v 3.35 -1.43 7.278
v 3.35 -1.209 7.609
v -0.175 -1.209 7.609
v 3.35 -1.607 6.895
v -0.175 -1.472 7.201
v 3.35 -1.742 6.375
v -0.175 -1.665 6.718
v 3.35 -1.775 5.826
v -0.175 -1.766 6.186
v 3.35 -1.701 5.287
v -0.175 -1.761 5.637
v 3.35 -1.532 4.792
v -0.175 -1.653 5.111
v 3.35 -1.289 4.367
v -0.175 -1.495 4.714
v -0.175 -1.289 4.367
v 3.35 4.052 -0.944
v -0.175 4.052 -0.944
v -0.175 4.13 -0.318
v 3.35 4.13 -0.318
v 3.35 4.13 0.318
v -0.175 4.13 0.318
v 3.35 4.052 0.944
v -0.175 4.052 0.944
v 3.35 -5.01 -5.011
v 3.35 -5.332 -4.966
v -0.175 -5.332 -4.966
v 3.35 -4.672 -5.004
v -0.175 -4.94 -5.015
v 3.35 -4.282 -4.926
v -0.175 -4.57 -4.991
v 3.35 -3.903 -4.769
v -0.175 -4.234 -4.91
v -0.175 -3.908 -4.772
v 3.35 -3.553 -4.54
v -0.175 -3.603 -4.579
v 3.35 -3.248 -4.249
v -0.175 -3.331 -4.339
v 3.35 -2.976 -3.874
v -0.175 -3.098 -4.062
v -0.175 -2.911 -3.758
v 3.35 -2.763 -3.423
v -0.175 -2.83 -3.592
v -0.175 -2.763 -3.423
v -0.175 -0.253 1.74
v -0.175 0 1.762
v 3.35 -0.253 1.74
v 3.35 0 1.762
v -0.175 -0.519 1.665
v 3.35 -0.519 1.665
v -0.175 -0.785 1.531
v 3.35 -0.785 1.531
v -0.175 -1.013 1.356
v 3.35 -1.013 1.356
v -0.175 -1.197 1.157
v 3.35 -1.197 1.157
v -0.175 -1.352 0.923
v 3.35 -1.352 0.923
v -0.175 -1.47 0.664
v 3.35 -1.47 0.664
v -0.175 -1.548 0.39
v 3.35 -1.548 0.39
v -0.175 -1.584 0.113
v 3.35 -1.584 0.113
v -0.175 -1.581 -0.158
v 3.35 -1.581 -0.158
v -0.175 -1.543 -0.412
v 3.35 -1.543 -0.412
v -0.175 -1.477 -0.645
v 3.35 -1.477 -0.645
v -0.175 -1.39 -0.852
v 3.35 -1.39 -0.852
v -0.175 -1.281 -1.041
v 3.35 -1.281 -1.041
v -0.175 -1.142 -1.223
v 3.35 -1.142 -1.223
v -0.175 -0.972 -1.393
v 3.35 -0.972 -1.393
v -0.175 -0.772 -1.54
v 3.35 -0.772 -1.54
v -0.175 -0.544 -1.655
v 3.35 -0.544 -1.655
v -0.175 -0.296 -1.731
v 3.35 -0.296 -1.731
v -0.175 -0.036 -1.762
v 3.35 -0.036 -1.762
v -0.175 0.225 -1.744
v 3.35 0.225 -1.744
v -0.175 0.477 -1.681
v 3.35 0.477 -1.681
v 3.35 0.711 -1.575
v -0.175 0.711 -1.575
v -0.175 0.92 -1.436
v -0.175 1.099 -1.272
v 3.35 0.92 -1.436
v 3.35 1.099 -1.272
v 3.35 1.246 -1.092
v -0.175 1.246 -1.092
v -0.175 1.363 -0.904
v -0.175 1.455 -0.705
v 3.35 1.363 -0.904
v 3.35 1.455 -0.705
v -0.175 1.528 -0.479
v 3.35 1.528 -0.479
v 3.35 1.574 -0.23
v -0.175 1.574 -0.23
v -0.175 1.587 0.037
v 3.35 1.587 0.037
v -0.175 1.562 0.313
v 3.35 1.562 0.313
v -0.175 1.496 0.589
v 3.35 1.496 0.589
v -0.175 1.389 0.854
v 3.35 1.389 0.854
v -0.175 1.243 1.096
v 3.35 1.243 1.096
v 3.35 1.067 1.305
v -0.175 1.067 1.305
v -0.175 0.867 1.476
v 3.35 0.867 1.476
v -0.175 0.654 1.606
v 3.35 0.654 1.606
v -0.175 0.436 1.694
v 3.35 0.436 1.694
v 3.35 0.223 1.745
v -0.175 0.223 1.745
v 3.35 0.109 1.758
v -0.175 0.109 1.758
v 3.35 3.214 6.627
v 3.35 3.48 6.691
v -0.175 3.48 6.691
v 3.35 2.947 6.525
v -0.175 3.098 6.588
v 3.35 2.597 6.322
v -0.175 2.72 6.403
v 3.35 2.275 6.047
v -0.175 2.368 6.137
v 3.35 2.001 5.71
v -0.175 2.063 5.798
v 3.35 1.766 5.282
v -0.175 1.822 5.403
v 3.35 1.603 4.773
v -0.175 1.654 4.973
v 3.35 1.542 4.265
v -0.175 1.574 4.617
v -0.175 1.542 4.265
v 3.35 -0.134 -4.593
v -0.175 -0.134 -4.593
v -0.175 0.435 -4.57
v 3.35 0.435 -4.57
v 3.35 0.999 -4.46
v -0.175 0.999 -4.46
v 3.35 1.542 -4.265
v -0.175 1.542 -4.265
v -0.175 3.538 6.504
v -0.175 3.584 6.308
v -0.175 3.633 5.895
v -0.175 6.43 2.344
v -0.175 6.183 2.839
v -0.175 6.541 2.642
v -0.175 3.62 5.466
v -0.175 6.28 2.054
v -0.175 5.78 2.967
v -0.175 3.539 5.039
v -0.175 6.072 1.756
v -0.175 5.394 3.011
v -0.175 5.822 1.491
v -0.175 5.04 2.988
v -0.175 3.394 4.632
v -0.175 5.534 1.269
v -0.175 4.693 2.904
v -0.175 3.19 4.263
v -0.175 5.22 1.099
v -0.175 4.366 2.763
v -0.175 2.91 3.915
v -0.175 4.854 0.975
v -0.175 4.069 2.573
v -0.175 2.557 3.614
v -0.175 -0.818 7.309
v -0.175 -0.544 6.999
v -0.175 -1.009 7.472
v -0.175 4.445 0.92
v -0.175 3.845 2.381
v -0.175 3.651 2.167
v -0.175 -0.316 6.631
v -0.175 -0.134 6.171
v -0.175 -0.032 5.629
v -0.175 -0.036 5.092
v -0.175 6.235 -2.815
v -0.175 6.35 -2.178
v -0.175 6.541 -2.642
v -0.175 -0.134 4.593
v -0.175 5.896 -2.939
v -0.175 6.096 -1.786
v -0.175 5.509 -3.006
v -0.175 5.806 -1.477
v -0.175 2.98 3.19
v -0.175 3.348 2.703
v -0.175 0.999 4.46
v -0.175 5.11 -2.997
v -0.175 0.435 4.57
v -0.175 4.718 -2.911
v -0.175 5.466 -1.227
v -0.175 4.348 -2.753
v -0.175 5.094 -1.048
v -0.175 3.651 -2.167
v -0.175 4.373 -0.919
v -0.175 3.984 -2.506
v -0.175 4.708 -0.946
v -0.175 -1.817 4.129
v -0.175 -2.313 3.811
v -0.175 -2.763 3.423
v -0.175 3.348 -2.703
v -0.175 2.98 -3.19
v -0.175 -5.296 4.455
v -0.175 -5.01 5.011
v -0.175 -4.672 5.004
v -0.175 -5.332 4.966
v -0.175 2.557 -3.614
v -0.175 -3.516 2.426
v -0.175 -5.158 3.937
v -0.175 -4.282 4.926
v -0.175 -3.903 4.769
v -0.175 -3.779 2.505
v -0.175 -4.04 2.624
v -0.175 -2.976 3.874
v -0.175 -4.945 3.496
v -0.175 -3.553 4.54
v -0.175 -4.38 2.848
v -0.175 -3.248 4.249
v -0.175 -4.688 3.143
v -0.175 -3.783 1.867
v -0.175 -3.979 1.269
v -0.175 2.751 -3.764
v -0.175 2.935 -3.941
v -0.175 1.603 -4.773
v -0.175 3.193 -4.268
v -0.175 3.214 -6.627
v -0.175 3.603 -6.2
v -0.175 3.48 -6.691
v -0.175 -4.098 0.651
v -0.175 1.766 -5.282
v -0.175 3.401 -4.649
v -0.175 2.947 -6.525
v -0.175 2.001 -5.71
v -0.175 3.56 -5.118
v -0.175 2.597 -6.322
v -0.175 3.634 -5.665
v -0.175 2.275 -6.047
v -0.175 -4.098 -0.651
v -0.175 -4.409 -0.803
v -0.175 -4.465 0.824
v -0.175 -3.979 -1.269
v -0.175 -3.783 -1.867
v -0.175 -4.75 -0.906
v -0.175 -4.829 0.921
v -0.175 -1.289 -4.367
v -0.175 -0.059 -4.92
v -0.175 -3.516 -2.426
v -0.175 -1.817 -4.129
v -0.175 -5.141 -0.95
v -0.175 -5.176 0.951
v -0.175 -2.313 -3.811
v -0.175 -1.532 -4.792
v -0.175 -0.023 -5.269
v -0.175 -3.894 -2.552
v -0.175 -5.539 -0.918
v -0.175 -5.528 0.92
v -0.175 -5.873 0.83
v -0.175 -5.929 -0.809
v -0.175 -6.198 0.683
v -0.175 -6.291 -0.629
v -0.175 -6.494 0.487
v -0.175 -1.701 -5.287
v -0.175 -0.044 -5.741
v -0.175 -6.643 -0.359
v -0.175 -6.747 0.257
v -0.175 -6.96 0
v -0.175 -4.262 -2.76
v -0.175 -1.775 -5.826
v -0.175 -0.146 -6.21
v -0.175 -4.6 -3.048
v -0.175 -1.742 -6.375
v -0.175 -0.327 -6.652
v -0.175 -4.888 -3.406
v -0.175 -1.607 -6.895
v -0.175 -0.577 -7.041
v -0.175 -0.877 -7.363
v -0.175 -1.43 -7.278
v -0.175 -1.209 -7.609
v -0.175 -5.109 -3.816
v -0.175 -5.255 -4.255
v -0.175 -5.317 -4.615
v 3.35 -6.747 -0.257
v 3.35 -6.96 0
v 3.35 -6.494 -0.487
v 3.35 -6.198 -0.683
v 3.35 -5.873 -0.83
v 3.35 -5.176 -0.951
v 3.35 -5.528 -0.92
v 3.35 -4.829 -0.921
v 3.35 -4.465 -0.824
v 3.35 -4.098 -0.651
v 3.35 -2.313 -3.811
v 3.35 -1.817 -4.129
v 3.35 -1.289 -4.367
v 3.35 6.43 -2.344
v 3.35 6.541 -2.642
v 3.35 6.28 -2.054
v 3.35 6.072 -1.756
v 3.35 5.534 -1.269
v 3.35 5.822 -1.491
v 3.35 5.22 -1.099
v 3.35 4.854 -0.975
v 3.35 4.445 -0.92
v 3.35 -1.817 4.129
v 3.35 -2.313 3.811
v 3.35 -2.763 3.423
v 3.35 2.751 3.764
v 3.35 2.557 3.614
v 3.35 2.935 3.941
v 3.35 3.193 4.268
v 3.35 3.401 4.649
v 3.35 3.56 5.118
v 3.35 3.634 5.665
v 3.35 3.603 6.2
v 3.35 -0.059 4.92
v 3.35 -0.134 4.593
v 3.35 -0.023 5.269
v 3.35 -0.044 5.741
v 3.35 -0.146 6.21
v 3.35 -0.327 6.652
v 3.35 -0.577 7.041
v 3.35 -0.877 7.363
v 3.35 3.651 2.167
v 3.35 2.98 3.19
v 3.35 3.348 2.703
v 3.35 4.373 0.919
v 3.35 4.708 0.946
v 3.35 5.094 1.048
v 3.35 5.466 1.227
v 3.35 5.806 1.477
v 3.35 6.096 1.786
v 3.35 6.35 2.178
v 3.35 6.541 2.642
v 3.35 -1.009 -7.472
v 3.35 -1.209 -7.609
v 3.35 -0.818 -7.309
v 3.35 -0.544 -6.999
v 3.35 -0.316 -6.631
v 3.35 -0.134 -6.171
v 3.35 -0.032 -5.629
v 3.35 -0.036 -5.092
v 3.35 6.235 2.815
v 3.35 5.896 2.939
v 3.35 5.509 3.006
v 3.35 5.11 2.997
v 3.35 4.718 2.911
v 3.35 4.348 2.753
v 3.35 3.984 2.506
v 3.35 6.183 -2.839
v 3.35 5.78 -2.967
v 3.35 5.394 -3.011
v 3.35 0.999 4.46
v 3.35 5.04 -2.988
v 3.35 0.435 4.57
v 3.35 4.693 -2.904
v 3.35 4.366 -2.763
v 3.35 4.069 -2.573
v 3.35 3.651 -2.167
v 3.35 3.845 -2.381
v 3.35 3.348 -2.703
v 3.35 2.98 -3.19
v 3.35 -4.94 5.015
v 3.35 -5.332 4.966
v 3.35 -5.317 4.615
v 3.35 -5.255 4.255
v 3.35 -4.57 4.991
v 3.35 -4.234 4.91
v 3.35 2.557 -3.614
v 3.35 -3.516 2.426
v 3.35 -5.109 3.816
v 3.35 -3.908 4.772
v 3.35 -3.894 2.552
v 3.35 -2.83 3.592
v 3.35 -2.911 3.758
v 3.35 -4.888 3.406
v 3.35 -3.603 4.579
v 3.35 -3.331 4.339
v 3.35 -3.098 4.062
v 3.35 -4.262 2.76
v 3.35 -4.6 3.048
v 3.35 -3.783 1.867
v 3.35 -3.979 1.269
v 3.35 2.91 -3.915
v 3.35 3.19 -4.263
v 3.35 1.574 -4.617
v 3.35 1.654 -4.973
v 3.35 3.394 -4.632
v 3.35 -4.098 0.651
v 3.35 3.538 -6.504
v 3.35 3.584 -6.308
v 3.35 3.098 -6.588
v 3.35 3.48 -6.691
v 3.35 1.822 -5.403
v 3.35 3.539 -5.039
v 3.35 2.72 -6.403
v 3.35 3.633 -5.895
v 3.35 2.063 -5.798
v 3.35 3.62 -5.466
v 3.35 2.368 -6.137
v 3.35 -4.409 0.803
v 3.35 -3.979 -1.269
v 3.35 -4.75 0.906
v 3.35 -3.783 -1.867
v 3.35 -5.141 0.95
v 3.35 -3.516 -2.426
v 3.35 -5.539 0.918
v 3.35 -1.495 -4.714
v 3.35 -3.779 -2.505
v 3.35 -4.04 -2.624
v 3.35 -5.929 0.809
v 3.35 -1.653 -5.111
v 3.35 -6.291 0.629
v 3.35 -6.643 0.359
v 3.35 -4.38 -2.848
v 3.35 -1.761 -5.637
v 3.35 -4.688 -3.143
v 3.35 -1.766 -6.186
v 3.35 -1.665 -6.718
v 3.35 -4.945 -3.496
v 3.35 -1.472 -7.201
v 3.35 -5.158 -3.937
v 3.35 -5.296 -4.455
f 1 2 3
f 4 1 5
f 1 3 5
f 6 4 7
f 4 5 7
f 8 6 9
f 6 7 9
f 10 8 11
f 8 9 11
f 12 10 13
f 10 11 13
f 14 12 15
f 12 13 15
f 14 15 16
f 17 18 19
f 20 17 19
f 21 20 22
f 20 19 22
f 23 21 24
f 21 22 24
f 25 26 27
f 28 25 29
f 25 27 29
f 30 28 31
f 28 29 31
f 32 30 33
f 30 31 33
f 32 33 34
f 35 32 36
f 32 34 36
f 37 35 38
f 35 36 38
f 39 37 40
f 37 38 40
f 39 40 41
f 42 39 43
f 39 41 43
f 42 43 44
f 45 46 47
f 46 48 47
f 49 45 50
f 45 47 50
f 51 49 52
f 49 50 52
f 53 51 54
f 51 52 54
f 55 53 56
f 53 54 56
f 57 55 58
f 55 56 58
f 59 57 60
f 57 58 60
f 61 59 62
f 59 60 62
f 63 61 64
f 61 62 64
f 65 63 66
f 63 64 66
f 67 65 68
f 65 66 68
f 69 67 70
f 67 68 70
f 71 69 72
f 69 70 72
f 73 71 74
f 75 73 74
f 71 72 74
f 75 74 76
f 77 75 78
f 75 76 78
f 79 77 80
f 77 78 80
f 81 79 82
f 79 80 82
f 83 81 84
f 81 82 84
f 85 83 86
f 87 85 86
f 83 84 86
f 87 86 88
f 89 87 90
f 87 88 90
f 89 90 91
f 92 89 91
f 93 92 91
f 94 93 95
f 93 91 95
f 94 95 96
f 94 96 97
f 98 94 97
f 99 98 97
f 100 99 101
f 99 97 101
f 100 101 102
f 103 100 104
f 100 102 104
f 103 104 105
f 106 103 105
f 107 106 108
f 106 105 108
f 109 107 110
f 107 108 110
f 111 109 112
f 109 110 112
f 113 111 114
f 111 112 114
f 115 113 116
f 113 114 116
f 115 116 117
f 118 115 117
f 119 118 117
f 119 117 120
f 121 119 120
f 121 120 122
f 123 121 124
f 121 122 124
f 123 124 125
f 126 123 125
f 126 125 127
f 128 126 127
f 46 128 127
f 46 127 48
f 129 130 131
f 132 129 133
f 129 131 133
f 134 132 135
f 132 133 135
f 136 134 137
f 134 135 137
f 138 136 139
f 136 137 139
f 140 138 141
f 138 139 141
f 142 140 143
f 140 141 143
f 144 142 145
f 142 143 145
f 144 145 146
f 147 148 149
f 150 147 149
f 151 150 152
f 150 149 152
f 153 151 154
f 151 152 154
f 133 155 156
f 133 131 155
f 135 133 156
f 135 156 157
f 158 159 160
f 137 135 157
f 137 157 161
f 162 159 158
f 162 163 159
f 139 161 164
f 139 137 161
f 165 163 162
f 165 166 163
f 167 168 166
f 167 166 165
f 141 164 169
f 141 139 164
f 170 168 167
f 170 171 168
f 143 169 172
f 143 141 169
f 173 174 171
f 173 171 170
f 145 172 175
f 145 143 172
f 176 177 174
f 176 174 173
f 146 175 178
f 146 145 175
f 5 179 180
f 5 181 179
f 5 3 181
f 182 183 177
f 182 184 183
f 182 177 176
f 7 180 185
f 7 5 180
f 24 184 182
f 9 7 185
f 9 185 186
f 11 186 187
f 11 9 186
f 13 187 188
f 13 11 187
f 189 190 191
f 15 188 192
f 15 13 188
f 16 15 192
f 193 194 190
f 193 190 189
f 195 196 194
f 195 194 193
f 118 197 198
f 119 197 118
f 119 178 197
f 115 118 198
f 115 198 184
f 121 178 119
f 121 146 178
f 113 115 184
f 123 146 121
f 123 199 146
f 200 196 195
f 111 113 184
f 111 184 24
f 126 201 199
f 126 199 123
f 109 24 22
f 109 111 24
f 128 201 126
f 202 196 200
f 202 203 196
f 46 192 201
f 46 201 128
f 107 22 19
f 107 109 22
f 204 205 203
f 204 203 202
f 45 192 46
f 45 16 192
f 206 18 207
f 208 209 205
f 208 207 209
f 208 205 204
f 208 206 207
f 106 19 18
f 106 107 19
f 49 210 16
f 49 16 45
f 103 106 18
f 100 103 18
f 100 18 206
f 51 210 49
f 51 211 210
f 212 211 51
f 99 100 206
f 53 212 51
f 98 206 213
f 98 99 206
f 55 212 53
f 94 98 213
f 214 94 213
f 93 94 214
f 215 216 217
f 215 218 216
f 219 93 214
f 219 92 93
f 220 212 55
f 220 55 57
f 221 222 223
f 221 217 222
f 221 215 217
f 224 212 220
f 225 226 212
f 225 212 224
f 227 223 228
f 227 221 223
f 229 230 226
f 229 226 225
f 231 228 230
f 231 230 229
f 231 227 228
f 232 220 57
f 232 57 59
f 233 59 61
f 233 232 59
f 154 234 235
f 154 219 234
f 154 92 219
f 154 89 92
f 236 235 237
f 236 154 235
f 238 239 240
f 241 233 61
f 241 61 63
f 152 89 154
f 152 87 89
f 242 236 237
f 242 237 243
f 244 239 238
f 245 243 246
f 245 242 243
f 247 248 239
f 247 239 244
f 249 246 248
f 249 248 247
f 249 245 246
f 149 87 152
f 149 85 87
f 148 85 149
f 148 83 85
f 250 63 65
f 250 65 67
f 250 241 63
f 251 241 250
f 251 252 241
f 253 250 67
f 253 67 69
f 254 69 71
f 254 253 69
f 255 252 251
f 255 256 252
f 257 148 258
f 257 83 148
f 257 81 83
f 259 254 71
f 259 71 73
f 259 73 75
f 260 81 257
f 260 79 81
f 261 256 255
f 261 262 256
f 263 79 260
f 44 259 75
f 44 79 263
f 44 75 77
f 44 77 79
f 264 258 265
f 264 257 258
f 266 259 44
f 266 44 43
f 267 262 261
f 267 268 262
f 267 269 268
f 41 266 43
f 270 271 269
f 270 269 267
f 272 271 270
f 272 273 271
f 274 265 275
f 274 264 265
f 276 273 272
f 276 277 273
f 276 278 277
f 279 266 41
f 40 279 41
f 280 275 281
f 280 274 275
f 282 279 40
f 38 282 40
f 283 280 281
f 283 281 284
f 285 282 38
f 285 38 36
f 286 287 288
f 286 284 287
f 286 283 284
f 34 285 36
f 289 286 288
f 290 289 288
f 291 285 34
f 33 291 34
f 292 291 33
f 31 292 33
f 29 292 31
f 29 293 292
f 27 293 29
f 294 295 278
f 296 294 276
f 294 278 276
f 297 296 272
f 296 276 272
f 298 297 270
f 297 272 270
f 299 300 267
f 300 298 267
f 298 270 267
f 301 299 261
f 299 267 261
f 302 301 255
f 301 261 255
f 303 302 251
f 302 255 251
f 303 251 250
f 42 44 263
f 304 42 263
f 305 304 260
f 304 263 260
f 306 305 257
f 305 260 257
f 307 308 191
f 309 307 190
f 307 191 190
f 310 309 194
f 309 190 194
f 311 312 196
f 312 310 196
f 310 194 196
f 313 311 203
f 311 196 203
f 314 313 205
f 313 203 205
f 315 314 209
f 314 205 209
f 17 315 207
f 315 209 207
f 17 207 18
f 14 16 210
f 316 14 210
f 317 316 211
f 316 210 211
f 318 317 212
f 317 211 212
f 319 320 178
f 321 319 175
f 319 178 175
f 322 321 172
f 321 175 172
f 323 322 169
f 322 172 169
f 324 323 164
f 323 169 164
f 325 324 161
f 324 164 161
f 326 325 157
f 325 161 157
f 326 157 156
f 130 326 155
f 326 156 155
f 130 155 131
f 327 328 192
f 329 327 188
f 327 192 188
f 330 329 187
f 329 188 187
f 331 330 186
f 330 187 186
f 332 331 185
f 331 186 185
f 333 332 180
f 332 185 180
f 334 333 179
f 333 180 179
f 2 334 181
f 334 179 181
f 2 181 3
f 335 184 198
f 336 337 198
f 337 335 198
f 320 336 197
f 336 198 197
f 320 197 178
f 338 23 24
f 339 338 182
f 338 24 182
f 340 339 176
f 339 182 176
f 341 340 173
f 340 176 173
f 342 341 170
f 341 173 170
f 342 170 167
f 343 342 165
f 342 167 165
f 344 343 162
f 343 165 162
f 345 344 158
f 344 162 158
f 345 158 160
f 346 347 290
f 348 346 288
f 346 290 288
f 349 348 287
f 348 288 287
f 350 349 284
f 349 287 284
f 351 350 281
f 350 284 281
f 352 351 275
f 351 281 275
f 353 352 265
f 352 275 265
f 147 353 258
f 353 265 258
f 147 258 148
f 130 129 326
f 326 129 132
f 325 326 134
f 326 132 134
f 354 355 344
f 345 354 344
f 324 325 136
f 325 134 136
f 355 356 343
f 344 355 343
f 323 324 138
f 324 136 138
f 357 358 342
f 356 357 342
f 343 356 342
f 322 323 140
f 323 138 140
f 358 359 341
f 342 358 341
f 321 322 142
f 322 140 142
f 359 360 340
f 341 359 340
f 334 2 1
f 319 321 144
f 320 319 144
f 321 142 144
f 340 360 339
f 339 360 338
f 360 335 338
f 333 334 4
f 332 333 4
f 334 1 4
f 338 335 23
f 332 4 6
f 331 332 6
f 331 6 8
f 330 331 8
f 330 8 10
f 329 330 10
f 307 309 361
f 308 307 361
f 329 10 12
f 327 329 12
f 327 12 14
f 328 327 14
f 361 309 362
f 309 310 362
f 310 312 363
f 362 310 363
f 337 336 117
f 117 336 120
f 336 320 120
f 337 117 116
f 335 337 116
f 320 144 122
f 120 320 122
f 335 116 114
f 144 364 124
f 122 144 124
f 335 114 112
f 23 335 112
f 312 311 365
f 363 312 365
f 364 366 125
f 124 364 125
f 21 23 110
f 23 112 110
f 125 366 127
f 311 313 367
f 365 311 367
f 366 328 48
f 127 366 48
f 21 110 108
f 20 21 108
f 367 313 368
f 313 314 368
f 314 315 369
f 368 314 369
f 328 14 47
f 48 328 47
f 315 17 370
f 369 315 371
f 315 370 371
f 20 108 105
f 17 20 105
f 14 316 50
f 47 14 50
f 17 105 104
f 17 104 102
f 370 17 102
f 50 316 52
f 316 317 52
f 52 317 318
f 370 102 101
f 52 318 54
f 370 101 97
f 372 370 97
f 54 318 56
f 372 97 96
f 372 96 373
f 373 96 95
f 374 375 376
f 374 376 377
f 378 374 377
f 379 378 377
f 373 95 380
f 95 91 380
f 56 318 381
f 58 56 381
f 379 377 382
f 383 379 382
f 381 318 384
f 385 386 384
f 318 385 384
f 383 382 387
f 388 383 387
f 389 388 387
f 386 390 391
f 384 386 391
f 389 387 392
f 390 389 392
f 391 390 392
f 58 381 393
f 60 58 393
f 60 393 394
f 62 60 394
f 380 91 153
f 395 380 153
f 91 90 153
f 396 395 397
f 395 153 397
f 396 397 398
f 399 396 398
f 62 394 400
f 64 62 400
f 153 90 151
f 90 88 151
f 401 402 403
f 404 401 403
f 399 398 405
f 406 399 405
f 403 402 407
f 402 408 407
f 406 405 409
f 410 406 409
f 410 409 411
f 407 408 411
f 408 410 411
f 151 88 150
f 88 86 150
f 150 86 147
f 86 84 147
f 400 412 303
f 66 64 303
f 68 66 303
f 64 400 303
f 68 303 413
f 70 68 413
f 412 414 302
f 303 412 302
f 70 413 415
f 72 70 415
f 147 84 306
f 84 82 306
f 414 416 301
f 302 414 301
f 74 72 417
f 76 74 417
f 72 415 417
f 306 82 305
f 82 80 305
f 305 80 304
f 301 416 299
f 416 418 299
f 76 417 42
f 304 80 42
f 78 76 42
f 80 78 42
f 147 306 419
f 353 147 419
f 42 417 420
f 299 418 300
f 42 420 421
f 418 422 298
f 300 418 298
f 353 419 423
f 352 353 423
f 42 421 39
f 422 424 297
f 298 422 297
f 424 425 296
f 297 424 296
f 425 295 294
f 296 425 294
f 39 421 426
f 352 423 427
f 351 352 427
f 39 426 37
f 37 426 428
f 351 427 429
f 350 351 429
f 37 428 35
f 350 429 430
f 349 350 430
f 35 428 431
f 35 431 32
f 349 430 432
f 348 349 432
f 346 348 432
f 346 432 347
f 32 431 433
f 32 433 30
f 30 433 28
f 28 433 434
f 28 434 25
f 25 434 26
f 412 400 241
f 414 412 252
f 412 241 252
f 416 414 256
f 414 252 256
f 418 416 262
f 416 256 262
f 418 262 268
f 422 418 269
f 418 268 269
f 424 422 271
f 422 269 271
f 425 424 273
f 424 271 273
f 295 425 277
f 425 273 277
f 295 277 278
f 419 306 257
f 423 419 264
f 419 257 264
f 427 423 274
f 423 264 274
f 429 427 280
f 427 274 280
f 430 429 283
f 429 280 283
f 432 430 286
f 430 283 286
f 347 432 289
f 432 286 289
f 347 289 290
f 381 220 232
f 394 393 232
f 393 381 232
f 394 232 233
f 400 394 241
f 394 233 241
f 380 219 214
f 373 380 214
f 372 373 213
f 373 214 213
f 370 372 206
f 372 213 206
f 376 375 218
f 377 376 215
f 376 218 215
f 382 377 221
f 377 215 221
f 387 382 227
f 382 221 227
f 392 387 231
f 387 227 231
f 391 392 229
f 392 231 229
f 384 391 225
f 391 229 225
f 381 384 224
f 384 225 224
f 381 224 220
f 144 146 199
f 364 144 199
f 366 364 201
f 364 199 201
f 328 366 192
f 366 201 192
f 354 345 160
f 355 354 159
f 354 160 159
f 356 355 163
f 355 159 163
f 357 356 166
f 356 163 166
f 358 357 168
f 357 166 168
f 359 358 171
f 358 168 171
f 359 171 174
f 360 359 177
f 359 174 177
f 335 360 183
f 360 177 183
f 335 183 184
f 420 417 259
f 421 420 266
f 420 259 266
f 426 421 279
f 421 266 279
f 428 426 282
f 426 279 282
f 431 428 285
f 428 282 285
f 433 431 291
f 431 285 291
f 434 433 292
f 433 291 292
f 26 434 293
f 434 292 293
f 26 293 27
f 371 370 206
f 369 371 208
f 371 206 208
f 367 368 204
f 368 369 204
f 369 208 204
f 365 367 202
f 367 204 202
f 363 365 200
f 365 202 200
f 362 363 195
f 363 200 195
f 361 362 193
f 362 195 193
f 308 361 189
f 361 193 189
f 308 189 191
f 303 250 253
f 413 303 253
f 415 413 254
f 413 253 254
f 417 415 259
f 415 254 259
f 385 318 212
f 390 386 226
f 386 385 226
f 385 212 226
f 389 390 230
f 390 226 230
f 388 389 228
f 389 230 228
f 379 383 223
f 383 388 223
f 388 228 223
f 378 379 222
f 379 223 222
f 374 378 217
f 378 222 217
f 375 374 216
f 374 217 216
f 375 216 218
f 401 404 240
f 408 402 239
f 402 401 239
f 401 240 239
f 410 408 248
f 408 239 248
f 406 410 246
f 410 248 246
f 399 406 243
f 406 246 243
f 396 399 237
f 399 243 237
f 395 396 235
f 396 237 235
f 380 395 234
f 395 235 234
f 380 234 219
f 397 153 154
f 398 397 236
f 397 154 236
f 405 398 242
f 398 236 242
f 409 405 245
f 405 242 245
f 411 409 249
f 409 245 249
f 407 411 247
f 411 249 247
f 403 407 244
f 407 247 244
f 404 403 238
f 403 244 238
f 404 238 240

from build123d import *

# Parameters (mm, degrees)
BASPROSKE_W     = 3.175
BASPROSKE_H     = 6.985
TOOTHCUT_DEPTH  = 11.375985495
TEETHCUTS_COUNT = 9
BORSKE_R        = 1.5875
BORE_DEPTH      = 50.8000508
SCALE1_SCALE_X  = 1.11
SCALE1_SCALE_Y  = 1
SCALE1_SCALE_Z  = 1.11


with BuildPart() as part:
    # BasProSke → Base-Revolve (revolve)
    with BuildSketch(Plane(origin=(0, 0, 0), x_dir=(1, 0, 0), z_dir=(0, 1, 0)), mode=Mode.PRIVATE) as base_revolve_sk:
        with Locations((1.5875, 3.4925)):
            Rectangle(BASPROSKE_W, BASPROSKE_H)
    revolve(base_revolve_sk.sketch.rotate(Axis((-10, 0, 0), (1, 0, 0)), 180), axis=Axis((-10, 0, 0), (1, 0, 0)))

    # TooCutSke → ToothCut (cut, through all)
    with BuildSketch(Plane(origin=(0, 0, 0), x_dir=(0, 0, -1), z_dir=(1, 0, 0))):
        with BuildLine():
            ThreePointArc((0.85090004, 4.051817513), (0, 4.1402), (-0.85090004, 4.051817513))
            ThreePointArc((-0.85090004, 4.051817513), (-1.187930048, 5.606894235), (-2.458065659, 6.565334826))
            ThreePointArc((-2.458065659, 6.565334826), (0, 7.0104), (2.458065659, 6.565334826))
            ThreePointArc((2.458065659, 6.565334826), (1.187930048, 5.606894235), (0.85090004, 4.051817513))
        make_face()
    toothcut = extrude(amount=TOOTHCUT_DEPTH, mode=Mode.SUBTRACT)

    # TeethCuts: ToothCut ×9 about axis
    teethcuts_axis = Axis((-10, 0, 0), (1, 0, 0))
    for i in range(1, TEETHCUTS_COUNT):
        add(toothcut.rotate(teethcuts_axis, i * 360 / TEETHCUTS_COUNT), mode=Mode.SUBTRACT)

    # BorSke → Bore (cut, symmetric)
    with BuildSketch(Plane(origin=(0, 0, 0), x_dir=(0, 0, -1), z_dir=(1, 0, 0))):
        with Locations(Location((0, 0, 0), (0, 0, 180))):
            Circle(BORSKE_R)
    extrude(amount=BORE_DEPTH, both=True, mode=Mode.SUBTRACT)


with BuildPart() as part_1:
    # Scale1: scaled about (1.5875, 0, 0)
    add(part.part.scale((SCALE1_SCALE_X, SCALE1_SCALE_Y, SCALE1_SCALE_Z), about=(1.5875, 0, 0)))


solid = part_1.part
